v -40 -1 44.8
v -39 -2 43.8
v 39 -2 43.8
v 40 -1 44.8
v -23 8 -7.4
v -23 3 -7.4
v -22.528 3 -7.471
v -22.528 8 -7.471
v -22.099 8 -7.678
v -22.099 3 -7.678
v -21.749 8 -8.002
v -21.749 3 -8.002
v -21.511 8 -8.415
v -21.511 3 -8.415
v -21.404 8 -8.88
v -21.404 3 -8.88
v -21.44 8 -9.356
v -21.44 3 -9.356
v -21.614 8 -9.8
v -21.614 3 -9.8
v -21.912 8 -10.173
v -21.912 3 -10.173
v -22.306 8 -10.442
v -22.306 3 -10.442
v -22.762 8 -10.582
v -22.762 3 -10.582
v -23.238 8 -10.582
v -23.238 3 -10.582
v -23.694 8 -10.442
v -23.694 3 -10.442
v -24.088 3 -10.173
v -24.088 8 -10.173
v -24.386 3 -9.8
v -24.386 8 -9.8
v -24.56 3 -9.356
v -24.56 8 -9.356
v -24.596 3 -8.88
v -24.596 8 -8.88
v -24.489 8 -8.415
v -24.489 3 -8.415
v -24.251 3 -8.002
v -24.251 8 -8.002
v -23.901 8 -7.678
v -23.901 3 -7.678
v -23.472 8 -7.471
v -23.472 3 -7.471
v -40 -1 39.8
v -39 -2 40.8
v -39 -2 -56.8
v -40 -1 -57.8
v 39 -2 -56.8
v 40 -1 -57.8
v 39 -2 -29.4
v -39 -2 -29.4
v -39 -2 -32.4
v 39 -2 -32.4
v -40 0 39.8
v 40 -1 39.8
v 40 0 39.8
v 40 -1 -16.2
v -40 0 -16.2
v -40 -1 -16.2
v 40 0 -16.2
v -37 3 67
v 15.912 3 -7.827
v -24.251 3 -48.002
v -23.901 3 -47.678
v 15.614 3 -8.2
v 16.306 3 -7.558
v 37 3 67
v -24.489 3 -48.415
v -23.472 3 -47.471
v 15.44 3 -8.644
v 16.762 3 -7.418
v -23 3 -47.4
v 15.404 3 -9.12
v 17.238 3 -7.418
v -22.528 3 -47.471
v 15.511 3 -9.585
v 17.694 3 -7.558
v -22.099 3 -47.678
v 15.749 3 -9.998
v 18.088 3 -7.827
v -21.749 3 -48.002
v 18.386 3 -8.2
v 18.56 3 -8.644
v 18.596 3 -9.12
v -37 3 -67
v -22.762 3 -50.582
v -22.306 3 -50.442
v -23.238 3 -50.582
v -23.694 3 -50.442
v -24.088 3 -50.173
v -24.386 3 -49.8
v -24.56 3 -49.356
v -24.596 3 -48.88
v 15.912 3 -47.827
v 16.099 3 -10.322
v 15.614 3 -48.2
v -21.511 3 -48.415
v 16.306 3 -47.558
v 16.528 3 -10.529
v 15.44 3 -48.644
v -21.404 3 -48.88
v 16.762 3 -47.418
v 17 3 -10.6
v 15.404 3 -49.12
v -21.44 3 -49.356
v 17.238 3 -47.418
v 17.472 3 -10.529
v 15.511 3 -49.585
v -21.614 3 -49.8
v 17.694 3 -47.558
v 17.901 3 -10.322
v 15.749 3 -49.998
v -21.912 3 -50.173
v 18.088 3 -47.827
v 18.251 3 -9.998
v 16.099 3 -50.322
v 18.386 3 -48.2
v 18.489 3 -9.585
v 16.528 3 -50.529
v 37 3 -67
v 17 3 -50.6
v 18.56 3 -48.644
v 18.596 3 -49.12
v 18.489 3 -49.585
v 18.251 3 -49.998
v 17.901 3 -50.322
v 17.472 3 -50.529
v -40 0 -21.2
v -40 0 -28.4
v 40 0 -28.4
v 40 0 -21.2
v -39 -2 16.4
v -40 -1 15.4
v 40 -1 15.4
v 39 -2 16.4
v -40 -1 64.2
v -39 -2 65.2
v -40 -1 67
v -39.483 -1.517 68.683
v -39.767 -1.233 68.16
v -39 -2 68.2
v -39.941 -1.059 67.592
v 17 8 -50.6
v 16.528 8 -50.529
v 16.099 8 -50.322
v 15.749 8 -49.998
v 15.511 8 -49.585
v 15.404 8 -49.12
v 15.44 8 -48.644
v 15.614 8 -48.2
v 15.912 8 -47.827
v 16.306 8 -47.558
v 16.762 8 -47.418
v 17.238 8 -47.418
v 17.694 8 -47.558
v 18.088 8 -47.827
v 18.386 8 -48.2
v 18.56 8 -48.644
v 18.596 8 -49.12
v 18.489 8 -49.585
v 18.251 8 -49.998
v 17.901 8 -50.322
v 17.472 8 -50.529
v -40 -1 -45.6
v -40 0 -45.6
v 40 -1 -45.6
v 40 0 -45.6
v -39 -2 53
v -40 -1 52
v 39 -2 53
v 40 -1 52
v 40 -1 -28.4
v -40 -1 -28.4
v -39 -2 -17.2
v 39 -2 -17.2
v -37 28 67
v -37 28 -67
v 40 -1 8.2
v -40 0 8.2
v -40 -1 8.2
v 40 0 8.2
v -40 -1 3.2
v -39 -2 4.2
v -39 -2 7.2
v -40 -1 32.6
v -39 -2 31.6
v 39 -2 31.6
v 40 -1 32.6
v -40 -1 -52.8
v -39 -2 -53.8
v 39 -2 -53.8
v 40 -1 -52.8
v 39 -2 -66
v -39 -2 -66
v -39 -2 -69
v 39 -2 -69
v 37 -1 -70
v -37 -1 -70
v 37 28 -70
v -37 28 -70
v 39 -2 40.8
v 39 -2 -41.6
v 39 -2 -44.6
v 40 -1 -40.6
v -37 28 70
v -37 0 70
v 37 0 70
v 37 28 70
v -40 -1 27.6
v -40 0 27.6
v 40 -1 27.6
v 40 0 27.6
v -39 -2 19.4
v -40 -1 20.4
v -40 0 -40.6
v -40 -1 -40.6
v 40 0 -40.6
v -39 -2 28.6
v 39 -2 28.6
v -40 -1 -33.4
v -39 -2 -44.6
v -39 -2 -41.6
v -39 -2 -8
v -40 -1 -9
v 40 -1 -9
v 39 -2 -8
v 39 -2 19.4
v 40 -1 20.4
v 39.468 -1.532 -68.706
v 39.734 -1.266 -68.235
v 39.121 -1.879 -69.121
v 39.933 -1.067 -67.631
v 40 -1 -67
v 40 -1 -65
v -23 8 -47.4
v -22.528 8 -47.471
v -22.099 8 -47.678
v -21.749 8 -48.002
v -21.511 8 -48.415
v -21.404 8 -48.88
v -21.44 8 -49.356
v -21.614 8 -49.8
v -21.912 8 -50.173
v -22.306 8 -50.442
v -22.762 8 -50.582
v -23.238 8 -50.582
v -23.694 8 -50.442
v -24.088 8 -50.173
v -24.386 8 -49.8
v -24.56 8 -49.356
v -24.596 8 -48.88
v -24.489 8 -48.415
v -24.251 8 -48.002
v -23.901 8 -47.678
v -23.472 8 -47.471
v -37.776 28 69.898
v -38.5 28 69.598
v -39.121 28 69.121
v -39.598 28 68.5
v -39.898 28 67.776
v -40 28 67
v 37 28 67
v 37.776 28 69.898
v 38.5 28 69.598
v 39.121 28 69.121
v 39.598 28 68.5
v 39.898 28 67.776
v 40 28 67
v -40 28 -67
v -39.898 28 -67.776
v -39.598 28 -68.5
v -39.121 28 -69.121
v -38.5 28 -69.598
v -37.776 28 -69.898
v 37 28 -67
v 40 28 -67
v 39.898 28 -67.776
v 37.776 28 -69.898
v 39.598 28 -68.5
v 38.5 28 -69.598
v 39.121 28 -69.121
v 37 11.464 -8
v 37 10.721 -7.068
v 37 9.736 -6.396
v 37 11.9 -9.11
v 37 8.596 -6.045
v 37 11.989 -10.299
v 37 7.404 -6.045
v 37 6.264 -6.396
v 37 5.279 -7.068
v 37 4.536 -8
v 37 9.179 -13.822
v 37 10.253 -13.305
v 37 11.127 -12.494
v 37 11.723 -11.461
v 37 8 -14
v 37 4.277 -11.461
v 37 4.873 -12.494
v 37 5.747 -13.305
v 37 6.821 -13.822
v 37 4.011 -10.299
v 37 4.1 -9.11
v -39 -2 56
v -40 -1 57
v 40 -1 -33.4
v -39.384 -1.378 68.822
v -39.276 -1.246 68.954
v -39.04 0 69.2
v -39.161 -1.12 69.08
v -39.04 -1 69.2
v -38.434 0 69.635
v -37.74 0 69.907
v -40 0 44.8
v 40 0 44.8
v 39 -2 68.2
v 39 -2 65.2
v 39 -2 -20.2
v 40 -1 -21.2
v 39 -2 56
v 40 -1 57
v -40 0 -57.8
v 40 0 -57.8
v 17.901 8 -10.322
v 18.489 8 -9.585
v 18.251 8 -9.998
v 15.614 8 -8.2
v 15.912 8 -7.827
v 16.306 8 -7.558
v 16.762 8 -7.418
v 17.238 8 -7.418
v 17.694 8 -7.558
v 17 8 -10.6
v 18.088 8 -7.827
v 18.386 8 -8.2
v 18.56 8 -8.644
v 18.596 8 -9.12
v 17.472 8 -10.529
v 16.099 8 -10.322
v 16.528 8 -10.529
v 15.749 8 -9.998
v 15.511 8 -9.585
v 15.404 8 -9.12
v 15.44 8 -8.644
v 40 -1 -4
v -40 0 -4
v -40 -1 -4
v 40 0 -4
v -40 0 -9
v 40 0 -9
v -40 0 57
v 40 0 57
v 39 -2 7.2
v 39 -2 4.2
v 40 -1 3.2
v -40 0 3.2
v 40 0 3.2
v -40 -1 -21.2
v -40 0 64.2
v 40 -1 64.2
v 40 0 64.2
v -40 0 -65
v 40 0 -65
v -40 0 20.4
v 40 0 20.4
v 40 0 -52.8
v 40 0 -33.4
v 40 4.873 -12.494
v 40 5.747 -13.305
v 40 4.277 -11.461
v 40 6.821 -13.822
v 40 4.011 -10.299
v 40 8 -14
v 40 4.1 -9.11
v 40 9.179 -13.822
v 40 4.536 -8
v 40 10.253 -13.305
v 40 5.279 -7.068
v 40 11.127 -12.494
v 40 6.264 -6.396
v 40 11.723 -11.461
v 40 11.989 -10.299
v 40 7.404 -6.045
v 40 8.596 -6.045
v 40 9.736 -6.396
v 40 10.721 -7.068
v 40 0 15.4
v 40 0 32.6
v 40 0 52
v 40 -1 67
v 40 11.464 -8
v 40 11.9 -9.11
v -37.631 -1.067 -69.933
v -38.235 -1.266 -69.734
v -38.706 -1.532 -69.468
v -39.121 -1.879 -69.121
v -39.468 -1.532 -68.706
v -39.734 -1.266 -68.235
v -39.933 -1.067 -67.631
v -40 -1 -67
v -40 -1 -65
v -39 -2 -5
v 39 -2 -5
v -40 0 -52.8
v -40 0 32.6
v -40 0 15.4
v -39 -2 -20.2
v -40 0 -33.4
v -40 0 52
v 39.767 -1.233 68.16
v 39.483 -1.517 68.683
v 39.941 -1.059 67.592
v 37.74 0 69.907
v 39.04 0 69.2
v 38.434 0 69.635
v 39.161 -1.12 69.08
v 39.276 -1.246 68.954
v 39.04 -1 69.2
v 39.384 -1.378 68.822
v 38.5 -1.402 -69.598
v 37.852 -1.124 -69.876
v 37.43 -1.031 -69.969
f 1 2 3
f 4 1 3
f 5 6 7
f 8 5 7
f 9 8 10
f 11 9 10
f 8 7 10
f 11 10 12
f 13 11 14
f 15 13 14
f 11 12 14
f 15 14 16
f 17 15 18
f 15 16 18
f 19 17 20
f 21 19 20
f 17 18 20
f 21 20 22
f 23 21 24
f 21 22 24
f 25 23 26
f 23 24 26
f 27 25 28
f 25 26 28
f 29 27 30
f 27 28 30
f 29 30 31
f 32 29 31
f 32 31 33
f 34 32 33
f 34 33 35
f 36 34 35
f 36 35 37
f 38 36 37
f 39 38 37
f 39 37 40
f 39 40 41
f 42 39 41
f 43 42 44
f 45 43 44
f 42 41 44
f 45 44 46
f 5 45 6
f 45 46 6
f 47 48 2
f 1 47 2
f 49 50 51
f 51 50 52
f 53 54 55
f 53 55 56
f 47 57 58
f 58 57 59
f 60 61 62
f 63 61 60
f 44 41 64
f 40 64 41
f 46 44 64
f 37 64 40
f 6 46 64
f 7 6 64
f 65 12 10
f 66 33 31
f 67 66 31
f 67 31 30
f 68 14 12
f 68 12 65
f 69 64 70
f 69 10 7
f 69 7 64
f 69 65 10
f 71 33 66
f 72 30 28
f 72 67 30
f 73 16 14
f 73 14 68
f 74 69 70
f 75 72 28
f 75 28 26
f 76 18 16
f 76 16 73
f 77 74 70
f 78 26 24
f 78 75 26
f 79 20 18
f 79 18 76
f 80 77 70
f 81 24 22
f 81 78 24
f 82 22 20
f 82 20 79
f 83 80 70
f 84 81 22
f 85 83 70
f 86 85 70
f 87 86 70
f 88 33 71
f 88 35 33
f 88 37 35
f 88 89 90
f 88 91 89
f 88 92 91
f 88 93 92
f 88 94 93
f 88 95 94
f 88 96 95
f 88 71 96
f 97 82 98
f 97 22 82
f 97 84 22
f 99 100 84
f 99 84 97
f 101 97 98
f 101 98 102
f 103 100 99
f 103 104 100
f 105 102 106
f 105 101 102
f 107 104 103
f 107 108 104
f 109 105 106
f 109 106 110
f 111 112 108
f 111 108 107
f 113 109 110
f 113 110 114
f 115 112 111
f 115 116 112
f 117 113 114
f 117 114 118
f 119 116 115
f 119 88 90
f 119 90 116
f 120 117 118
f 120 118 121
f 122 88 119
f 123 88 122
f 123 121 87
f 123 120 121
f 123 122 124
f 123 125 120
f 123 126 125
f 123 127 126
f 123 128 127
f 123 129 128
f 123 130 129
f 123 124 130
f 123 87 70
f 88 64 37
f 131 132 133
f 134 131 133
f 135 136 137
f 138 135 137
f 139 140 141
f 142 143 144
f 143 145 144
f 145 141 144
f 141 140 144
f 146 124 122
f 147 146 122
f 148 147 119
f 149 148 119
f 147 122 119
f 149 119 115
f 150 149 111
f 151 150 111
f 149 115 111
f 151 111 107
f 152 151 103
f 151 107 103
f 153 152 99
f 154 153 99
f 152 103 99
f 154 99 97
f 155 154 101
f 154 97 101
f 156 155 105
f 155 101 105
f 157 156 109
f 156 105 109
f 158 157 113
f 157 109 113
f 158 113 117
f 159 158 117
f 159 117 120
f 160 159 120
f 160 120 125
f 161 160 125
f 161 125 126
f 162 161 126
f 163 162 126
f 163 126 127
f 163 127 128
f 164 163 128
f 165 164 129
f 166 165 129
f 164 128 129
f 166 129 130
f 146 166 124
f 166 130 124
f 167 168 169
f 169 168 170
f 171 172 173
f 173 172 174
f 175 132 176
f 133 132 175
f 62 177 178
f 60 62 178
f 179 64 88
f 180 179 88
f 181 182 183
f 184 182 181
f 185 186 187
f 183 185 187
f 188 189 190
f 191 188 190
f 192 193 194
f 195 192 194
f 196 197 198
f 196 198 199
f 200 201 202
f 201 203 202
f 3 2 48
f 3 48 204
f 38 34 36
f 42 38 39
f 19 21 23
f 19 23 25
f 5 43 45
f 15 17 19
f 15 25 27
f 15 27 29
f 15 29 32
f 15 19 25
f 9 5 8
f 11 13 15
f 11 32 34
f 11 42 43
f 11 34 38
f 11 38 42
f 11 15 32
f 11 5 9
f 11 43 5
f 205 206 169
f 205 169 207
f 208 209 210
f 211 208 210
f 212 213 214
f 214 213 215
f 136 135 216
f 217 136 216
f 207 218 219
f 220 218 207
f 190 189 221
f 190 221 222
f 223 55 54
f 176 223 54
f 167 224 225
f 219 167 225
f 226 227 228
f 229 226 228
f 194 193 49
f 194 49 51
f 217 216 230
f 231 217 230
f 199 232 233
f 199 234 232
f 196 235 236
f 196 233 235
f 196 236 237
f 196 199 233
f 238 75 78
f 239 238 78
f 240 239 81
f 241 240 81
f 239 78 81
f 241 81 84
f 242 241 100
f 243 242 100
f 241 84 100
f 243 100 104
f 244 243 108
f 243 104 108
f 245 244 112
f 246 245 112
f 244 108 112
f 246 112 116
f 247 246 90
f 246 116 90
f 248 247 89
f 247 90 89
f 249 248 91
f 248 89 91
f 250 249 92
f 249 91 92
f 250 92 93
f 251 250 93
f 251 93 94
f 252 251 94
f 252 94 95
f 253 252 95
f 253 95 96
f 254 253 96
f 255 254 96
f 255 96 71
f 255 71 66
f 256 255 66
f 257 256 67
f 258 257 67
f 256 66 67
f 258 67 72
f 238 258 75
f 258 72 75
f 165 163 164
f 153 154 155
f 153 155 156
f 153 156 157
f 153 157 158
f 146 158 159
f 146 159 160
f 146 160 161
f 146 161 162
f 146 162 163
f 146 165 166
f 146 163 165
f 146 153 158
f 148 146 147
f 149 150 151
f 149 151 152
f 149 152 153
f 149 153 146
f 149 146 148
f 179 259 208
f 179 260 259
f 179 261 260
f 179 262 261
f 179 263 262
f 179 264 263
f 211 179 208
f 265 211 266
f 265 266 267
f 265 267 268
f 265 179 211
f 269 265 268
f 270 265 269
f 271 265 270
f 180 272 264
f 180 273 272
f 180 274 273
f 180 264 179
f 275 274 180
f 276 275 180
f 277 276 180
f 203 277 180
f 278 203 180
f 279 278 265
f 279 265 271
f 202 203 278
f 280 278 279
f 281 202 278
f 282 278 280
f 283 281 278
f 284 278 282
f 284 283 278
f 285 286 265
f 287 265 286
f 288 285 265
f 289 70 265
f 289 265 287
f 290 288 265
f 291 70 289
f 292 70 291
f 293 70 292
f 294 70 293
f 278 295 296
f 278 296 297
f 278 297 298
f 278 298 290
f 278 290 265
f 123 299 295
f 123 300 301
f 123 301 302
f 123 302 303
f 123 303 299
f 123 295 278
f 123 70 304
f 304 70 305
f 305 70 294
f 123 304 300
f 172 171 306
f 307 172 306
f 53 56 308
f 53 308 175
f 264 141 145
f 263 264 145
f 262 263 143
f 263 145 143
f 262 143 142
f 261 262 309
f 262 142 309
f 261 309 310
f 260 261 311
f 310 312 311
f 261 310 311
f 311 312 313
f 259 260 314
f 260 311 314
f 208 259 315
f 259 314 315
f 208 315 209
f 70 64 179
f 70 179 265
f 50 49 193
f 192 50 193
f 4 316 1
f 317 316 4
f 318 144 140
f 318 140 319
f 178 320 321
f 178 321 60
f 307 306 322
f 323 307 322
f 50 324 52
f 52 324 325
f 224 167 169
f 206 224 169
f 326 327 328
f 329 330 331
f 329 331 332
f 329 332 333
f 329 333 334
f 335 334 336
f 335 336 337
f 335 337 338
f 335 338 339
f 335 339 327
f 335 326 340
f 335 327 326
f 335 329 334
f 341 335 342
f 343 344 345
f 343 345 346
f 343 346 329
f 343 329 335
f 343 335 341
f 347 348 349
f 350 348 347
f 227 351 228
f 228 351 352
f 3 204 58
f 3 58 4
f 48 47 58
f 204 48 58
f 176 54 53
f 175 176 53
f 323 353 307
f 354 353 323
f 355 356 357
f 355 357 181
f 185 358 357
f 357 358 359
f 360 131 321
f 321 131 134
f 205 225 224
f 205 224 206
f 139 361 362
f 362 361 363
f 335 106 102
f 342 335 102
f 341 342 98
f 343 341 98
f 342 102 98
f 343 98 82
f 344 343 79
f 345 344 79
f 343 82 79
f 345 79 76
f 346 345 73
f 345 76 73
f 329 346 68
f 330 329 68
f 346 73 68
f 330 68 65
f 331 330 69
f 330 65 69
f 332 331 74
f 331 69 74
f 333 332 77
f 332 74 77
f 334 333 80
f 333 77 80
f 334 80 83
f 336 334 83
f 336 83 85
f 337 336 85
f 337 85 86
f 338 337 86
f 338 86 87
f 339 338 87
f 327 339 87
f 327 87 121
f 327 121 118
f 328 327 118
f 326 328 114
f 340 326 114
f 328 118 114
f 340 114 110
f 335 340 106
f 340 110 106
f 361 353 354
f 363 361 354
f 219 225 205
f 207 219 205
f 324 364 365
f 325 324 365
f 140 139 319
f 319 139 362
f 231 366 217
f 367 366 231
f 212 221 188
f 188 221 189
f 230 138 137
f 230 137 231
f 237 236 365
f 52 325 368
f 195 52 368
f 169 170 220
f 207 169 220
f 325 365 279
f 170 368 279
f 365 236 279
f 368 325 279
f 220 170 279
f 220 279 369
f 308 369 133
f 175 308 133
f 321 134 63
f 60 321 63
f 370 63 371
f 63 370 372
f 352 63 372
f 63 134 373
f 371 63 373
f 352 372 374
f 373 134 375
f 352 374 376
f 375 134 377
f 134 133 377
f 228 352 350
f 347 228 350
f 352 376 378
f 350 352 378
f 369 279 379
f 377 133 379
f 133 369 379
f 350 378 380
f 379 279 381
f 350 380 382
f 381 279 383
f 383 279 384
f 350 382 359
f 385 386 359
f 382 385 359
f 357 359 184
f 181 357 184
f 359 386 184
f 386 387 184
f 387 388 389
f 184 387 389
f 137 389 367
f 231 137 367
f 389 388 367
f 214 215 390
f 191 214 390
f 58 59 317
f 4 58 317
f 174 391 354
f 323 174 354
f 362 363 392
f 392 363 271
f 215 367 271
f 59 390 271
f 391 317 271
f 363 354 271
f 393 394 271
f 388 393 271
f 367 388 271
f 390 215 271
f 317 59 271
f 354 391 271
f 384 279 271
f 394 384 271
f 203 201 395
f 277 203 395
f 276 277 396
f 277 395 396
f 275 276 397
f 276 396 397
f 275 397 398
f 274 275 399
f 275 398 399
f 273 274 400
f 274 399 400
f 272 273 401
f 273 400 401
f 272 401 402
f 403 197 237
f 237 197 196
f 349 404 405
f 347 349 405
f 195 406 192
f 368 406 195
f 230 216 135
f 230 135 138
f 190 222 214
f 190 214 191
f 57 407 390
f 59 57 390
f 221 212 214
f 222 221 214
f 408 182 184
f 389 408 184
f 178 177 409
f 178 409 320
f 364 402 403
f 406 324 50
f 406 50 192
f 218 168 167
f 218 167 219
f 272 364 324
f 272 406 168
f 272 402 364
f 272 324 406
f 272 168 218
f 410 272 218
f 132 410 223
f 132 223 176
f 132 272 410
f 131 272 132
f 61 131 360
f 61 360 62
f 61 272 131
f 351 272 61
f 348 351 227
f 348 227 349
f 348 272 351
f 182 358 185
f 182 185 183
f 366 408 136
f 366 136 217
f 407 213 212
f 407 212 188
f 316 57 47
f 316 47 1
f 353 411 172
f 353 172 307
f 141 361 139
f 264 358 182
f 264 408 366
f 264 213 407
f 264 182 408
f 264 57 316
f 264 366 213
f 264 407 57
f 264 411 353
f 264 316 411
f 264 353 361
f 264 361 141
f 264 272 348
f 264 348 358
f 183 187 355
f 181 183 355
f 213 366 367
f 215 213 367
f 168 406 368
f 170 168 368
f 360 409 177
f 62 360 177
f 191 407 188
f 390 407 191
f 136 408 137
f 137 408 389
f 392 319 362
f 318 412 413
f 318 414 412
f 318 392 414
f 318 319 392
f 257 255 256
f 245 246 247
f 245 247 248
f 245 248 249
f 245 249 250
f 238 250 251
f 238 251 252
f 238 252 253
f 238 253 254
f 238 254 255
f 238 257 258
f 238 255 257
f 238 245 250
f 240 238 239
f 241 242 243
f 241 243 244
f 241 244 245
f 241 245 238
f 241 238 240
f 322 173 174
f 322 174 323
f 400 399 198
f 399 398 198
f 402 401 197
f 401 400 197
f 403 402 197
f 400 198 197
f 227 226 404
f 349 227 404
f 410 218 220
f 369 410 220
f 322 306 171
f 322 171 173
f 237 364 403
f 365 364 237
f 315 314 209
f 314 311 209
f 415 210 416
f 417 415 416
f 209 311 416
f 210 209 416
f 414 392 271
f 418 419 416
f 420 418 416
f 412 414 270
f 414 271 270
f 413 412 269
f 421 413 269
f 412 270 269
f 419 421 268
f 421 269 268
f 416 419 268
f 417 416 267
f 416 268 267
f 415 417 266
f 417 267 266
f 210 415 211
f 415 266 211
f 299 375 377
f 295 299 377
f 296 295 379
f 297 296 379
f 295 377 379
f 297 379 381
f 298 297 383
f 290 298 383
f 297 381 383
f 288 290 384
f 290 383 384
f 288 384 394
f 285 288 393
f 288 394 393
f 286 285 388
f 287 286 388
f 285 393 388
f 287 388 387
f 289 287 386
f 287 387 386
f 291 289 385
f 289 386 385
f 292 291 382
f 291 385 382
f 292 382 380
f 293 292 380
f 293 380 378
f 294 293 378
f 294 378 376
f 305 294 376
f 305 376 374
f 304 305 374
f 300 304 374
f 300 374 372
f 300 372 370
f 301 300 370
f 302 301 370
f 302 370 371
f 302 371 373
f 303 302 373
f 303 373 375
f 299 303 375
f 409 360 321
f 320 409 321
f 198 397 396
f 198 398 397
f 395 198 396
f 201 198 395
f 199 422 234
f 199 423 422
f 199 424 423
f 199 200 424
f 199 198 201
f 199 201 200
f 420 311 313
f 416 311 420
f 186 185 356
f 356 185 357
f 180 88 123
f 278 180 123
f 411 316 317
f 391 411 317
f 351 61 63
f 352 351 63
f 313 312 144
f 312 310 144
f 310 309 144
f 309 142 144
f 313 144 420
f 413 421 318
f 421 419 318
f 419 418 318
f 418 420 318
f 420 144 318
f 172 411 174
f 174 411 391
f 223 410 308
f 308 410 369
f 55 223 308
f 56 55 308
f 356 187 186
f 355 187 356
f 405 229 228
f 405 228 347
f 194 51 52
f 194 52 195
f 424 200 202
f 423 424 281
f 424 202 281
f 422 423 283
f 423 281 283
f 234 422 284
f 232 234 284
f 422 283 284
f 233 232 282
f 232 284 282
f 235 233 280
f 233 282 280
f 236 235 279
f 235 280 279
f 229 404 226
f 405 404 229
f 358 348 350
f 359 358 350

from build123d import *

# Parameters (mm, degrees)
SKETCH1_W           = 80
SKETCH1_H           = 140
BOSS_EXTRUDE1_DEPTH = 3
SKETCH2_W           = 80
SKETCH2_H           = 140
SKETCH2_W_2         = 74
SKETCH2_H_2         = 134
BOSS_EXTRUDE2_DEPTH = 25
SKETCH3_R           = 1.6
BOSS_EXTRUDE3_DEPTH = 5
SKETCH4_W           = 80
SKETCH4_H           = 5
BOSS_EXTRUDE4_DEPTH = 2
CHAMFER1_SIZE       = 1
SKETCH5_R           = 4
CUT_EXTRUDE1_DEPTH  = 10
FILLET1_R           = 3


with BuildPart() as part:
    # Sketch1 → Boss-Extrude1 (new body)
    with BuildSketch(Plane(origin=(0, 0, 0), x_dir=(1, 0, 0), z_dir=(0, 1, 0))):
        Rectangle(SKETCH1_W, SKETCH1_H)
    extrude(amount=BOSS_EXTRUDE1_DEPTH)

    # Sketch2 → Boss-Extrude2 (add)
    with BuildSketch(Plane(origin=(0, 3, 0), x_dir=(1, 0, 0), z_dir=(0, 1, 0))):
        Rectangle(SKETCH2_W, SKETCH2_H)
        Rectangle(SKETCH2_W_2, SKETCH2_H_2, mode=Mode.SUBTRACT)
    extrude(amount=BOSS_EXTRUDE2_DEPTH)

    # Sketch3 → Boss-Extrude3 (add)
    with BuildSketch(Plane(origin=(0, 3, 0), x_dir=(1, 0, 0), z_dir=(0, 1, 0))):
        with Locations(Location((-23, 49, 0), (0, 0, 270))):
            Circle(SKETCH3_R)
        with Locations(Location((-23, 9, 0), (0, 0, 270))):
            Circle(SKETCH3_R)
        with Locations(Location((17, 9, 0), (0, 0, 90))):
            Circle(SKETCH3_R)
        with Locations(Location((17, 49, 0), (0, 0, 90))):
            Circle(SKETCH3_R)
    extrude(amount=BOSS_EXTRUDE3_DEPTH)

    # Sketch4 → Boss-Extrude4 (add)
    with BuildSketch(Plane.XZ):
        with Locations((0, -67.5)):
            Rectangle(SKETCH4_W, SKETCH4_H)
        with Locations((0, -55.3)):
            Rectangle(SKETCH4_W, SKETCH4_H)
        with Locations((0, -43.1)):
            Rectangle(SKETCH4_W, SKETCH4_H)
        with Locations((0, -30.9)):
            Rectangle(SKETCH4_W, SKETCH4_H)
        with Locations((0, -18.7)):
            Rectangle(SKETCH4_W, SKETCH4_H)
        with Locations((0, -6.5)):
            Rectangle(SKETCH4_W, SKETCH4_H)
        with Locations((0, 5.7)):
            Rectangle(SKETCH4_W, SKETCH4_H)
        with Locations((0, 17.9)):
            Rectangle(SKETCH4_W, SKETCH4_H)
        with Locations((0, 30.1)):
            Rectangle(SKETCH4_W, SKETCH4_H)
        with Locations((0, 42.3)):
            Rectangle(SKETCH4_W, SKETCH4_H)
        with Locations((0, 54.5)):
            Rectangle(SKETCH4_W, SKETCH4_H)
        with Locations((0, 66.7)):
            Rectangle(SKETCH4_W, SKETCH4_H)
    extrude(amount=BOSS_EXTRUDE4_DEPTH)

    # Chamfer1
    chamfer1_edges = [part.edges().sort_by_distance(p)[0] for p in [
        (0, -2, -16.2),
        (-40, -2, -6.5),
        (0, -2, -9),
        (40, -2, -6.5),
        (0, -2, -4),
        (-40, -2, 5.7),
        (0, -2, 3.2),
        (40, -2, 5.7),
        (0, -2, 8.2),
        (-40, -2, 17.9),
        (0, -2, 15.4),
        (40, -2, 17.9),
        (0, -2, 20.4),
        (-40, -2, 30.1),
        (0, -2, 27.6),
        (40, -2, 30.1),
        (0, -2, 32.6),
        (-40, -2, 42.3),
        (0, -2, 39.8),
        (40, -2, 42.3),
        (0, -2, 44.8),
        (-40, -2, 54.5),
        (0, -2, 52),
        (40, -2, 54.5),
        (0, -2, 57),
        (-40, -2, 66.7),
        (0, -2, 64.2),
        (40, -2, 66.7),
        (0, -2, 69.2),
        (-40, -2, -67.5),
        (0, -2, -70),
        (40, -2, -67.5),
        (0, -2, -65),
        (-40, -2, -55.3),
        (0, -2, -57.8),
        (40, -2, -55.3),
        (0, -2, -52.8),
        (-40, -2, -43.1),
        (0, -2, -45.6),
        (40, -2, -43.1),
        (0, -2, -40.6),
        (-40, -2, -30.9),
        (0, -2, -33.4),
        (40, -2, -30.9),
        (0, -2, -28.4),
        (-40, -2, -18.7),
        (0, -2, -21.2),
        (40, -2, -18.7),
    ]]
    chamfer(chamfer1_edges, length=CHAMFER1_SIZE)

    # Sketch5 → Cut-Extrude1 (cut)
    with BuildSketch(Plane(origin=(40, 0, 0), x_dir=(0, 0, -1), z_dir=(1, 0, 0))):
        with Locations((10, 8)):
            Circle(SKETCH5_R)
    extrude(amount=-CUT_EXTRUDE1_DEPTH, mode=Mode.SUBTRACT)

    # Fillet1
    # the kernel refuses this fillet: 3 mm, written as the material it takes off along each edge
    with BuildSketch(Plane(origin=(40, 35.5, 70), x_dir=(0, 0, -1), z_dir=(0, -1, 0)), Plane(origin=(-40, -7.5, 70), x_dir=(0, 0, -1), z_dir=(0, 1, 0))) as fillet1_piece_1:
        with BuildLine():
            CenterArc((FILLET1_R, -FILLET1_R), FILLET1_R, 90, 90)
            Line((0, -FILLET1_R), (0, 0))
            Line((0, 0), (FILLET1_R, 0))
        make_face()
    extrude(amount=43, mode=Mode.SUBTRACT)
    with BuildSketch(Plane(origin=(40, 35.5, -70), x_dir=(-1, 0, 0), z_dir=(0, -1, 0)), Plane(origin=(-40, -8.5, -70), x_dir=(1, 0, 0), z_dir=(0, 1, 0))) as fillet1_piece_2:
        with BuildLine():
            CenterArc((FILLET1_R, -FILLET1_R), FILLET1_R, 90, 90)
            Line((0, -FILLET1_R), (0, 0))
            Line((0, 0), (FILLET1_R, 0))
        make_face()
    extrude(amount=44, mode=Mode.SUBTRACT)


solid = part.part
